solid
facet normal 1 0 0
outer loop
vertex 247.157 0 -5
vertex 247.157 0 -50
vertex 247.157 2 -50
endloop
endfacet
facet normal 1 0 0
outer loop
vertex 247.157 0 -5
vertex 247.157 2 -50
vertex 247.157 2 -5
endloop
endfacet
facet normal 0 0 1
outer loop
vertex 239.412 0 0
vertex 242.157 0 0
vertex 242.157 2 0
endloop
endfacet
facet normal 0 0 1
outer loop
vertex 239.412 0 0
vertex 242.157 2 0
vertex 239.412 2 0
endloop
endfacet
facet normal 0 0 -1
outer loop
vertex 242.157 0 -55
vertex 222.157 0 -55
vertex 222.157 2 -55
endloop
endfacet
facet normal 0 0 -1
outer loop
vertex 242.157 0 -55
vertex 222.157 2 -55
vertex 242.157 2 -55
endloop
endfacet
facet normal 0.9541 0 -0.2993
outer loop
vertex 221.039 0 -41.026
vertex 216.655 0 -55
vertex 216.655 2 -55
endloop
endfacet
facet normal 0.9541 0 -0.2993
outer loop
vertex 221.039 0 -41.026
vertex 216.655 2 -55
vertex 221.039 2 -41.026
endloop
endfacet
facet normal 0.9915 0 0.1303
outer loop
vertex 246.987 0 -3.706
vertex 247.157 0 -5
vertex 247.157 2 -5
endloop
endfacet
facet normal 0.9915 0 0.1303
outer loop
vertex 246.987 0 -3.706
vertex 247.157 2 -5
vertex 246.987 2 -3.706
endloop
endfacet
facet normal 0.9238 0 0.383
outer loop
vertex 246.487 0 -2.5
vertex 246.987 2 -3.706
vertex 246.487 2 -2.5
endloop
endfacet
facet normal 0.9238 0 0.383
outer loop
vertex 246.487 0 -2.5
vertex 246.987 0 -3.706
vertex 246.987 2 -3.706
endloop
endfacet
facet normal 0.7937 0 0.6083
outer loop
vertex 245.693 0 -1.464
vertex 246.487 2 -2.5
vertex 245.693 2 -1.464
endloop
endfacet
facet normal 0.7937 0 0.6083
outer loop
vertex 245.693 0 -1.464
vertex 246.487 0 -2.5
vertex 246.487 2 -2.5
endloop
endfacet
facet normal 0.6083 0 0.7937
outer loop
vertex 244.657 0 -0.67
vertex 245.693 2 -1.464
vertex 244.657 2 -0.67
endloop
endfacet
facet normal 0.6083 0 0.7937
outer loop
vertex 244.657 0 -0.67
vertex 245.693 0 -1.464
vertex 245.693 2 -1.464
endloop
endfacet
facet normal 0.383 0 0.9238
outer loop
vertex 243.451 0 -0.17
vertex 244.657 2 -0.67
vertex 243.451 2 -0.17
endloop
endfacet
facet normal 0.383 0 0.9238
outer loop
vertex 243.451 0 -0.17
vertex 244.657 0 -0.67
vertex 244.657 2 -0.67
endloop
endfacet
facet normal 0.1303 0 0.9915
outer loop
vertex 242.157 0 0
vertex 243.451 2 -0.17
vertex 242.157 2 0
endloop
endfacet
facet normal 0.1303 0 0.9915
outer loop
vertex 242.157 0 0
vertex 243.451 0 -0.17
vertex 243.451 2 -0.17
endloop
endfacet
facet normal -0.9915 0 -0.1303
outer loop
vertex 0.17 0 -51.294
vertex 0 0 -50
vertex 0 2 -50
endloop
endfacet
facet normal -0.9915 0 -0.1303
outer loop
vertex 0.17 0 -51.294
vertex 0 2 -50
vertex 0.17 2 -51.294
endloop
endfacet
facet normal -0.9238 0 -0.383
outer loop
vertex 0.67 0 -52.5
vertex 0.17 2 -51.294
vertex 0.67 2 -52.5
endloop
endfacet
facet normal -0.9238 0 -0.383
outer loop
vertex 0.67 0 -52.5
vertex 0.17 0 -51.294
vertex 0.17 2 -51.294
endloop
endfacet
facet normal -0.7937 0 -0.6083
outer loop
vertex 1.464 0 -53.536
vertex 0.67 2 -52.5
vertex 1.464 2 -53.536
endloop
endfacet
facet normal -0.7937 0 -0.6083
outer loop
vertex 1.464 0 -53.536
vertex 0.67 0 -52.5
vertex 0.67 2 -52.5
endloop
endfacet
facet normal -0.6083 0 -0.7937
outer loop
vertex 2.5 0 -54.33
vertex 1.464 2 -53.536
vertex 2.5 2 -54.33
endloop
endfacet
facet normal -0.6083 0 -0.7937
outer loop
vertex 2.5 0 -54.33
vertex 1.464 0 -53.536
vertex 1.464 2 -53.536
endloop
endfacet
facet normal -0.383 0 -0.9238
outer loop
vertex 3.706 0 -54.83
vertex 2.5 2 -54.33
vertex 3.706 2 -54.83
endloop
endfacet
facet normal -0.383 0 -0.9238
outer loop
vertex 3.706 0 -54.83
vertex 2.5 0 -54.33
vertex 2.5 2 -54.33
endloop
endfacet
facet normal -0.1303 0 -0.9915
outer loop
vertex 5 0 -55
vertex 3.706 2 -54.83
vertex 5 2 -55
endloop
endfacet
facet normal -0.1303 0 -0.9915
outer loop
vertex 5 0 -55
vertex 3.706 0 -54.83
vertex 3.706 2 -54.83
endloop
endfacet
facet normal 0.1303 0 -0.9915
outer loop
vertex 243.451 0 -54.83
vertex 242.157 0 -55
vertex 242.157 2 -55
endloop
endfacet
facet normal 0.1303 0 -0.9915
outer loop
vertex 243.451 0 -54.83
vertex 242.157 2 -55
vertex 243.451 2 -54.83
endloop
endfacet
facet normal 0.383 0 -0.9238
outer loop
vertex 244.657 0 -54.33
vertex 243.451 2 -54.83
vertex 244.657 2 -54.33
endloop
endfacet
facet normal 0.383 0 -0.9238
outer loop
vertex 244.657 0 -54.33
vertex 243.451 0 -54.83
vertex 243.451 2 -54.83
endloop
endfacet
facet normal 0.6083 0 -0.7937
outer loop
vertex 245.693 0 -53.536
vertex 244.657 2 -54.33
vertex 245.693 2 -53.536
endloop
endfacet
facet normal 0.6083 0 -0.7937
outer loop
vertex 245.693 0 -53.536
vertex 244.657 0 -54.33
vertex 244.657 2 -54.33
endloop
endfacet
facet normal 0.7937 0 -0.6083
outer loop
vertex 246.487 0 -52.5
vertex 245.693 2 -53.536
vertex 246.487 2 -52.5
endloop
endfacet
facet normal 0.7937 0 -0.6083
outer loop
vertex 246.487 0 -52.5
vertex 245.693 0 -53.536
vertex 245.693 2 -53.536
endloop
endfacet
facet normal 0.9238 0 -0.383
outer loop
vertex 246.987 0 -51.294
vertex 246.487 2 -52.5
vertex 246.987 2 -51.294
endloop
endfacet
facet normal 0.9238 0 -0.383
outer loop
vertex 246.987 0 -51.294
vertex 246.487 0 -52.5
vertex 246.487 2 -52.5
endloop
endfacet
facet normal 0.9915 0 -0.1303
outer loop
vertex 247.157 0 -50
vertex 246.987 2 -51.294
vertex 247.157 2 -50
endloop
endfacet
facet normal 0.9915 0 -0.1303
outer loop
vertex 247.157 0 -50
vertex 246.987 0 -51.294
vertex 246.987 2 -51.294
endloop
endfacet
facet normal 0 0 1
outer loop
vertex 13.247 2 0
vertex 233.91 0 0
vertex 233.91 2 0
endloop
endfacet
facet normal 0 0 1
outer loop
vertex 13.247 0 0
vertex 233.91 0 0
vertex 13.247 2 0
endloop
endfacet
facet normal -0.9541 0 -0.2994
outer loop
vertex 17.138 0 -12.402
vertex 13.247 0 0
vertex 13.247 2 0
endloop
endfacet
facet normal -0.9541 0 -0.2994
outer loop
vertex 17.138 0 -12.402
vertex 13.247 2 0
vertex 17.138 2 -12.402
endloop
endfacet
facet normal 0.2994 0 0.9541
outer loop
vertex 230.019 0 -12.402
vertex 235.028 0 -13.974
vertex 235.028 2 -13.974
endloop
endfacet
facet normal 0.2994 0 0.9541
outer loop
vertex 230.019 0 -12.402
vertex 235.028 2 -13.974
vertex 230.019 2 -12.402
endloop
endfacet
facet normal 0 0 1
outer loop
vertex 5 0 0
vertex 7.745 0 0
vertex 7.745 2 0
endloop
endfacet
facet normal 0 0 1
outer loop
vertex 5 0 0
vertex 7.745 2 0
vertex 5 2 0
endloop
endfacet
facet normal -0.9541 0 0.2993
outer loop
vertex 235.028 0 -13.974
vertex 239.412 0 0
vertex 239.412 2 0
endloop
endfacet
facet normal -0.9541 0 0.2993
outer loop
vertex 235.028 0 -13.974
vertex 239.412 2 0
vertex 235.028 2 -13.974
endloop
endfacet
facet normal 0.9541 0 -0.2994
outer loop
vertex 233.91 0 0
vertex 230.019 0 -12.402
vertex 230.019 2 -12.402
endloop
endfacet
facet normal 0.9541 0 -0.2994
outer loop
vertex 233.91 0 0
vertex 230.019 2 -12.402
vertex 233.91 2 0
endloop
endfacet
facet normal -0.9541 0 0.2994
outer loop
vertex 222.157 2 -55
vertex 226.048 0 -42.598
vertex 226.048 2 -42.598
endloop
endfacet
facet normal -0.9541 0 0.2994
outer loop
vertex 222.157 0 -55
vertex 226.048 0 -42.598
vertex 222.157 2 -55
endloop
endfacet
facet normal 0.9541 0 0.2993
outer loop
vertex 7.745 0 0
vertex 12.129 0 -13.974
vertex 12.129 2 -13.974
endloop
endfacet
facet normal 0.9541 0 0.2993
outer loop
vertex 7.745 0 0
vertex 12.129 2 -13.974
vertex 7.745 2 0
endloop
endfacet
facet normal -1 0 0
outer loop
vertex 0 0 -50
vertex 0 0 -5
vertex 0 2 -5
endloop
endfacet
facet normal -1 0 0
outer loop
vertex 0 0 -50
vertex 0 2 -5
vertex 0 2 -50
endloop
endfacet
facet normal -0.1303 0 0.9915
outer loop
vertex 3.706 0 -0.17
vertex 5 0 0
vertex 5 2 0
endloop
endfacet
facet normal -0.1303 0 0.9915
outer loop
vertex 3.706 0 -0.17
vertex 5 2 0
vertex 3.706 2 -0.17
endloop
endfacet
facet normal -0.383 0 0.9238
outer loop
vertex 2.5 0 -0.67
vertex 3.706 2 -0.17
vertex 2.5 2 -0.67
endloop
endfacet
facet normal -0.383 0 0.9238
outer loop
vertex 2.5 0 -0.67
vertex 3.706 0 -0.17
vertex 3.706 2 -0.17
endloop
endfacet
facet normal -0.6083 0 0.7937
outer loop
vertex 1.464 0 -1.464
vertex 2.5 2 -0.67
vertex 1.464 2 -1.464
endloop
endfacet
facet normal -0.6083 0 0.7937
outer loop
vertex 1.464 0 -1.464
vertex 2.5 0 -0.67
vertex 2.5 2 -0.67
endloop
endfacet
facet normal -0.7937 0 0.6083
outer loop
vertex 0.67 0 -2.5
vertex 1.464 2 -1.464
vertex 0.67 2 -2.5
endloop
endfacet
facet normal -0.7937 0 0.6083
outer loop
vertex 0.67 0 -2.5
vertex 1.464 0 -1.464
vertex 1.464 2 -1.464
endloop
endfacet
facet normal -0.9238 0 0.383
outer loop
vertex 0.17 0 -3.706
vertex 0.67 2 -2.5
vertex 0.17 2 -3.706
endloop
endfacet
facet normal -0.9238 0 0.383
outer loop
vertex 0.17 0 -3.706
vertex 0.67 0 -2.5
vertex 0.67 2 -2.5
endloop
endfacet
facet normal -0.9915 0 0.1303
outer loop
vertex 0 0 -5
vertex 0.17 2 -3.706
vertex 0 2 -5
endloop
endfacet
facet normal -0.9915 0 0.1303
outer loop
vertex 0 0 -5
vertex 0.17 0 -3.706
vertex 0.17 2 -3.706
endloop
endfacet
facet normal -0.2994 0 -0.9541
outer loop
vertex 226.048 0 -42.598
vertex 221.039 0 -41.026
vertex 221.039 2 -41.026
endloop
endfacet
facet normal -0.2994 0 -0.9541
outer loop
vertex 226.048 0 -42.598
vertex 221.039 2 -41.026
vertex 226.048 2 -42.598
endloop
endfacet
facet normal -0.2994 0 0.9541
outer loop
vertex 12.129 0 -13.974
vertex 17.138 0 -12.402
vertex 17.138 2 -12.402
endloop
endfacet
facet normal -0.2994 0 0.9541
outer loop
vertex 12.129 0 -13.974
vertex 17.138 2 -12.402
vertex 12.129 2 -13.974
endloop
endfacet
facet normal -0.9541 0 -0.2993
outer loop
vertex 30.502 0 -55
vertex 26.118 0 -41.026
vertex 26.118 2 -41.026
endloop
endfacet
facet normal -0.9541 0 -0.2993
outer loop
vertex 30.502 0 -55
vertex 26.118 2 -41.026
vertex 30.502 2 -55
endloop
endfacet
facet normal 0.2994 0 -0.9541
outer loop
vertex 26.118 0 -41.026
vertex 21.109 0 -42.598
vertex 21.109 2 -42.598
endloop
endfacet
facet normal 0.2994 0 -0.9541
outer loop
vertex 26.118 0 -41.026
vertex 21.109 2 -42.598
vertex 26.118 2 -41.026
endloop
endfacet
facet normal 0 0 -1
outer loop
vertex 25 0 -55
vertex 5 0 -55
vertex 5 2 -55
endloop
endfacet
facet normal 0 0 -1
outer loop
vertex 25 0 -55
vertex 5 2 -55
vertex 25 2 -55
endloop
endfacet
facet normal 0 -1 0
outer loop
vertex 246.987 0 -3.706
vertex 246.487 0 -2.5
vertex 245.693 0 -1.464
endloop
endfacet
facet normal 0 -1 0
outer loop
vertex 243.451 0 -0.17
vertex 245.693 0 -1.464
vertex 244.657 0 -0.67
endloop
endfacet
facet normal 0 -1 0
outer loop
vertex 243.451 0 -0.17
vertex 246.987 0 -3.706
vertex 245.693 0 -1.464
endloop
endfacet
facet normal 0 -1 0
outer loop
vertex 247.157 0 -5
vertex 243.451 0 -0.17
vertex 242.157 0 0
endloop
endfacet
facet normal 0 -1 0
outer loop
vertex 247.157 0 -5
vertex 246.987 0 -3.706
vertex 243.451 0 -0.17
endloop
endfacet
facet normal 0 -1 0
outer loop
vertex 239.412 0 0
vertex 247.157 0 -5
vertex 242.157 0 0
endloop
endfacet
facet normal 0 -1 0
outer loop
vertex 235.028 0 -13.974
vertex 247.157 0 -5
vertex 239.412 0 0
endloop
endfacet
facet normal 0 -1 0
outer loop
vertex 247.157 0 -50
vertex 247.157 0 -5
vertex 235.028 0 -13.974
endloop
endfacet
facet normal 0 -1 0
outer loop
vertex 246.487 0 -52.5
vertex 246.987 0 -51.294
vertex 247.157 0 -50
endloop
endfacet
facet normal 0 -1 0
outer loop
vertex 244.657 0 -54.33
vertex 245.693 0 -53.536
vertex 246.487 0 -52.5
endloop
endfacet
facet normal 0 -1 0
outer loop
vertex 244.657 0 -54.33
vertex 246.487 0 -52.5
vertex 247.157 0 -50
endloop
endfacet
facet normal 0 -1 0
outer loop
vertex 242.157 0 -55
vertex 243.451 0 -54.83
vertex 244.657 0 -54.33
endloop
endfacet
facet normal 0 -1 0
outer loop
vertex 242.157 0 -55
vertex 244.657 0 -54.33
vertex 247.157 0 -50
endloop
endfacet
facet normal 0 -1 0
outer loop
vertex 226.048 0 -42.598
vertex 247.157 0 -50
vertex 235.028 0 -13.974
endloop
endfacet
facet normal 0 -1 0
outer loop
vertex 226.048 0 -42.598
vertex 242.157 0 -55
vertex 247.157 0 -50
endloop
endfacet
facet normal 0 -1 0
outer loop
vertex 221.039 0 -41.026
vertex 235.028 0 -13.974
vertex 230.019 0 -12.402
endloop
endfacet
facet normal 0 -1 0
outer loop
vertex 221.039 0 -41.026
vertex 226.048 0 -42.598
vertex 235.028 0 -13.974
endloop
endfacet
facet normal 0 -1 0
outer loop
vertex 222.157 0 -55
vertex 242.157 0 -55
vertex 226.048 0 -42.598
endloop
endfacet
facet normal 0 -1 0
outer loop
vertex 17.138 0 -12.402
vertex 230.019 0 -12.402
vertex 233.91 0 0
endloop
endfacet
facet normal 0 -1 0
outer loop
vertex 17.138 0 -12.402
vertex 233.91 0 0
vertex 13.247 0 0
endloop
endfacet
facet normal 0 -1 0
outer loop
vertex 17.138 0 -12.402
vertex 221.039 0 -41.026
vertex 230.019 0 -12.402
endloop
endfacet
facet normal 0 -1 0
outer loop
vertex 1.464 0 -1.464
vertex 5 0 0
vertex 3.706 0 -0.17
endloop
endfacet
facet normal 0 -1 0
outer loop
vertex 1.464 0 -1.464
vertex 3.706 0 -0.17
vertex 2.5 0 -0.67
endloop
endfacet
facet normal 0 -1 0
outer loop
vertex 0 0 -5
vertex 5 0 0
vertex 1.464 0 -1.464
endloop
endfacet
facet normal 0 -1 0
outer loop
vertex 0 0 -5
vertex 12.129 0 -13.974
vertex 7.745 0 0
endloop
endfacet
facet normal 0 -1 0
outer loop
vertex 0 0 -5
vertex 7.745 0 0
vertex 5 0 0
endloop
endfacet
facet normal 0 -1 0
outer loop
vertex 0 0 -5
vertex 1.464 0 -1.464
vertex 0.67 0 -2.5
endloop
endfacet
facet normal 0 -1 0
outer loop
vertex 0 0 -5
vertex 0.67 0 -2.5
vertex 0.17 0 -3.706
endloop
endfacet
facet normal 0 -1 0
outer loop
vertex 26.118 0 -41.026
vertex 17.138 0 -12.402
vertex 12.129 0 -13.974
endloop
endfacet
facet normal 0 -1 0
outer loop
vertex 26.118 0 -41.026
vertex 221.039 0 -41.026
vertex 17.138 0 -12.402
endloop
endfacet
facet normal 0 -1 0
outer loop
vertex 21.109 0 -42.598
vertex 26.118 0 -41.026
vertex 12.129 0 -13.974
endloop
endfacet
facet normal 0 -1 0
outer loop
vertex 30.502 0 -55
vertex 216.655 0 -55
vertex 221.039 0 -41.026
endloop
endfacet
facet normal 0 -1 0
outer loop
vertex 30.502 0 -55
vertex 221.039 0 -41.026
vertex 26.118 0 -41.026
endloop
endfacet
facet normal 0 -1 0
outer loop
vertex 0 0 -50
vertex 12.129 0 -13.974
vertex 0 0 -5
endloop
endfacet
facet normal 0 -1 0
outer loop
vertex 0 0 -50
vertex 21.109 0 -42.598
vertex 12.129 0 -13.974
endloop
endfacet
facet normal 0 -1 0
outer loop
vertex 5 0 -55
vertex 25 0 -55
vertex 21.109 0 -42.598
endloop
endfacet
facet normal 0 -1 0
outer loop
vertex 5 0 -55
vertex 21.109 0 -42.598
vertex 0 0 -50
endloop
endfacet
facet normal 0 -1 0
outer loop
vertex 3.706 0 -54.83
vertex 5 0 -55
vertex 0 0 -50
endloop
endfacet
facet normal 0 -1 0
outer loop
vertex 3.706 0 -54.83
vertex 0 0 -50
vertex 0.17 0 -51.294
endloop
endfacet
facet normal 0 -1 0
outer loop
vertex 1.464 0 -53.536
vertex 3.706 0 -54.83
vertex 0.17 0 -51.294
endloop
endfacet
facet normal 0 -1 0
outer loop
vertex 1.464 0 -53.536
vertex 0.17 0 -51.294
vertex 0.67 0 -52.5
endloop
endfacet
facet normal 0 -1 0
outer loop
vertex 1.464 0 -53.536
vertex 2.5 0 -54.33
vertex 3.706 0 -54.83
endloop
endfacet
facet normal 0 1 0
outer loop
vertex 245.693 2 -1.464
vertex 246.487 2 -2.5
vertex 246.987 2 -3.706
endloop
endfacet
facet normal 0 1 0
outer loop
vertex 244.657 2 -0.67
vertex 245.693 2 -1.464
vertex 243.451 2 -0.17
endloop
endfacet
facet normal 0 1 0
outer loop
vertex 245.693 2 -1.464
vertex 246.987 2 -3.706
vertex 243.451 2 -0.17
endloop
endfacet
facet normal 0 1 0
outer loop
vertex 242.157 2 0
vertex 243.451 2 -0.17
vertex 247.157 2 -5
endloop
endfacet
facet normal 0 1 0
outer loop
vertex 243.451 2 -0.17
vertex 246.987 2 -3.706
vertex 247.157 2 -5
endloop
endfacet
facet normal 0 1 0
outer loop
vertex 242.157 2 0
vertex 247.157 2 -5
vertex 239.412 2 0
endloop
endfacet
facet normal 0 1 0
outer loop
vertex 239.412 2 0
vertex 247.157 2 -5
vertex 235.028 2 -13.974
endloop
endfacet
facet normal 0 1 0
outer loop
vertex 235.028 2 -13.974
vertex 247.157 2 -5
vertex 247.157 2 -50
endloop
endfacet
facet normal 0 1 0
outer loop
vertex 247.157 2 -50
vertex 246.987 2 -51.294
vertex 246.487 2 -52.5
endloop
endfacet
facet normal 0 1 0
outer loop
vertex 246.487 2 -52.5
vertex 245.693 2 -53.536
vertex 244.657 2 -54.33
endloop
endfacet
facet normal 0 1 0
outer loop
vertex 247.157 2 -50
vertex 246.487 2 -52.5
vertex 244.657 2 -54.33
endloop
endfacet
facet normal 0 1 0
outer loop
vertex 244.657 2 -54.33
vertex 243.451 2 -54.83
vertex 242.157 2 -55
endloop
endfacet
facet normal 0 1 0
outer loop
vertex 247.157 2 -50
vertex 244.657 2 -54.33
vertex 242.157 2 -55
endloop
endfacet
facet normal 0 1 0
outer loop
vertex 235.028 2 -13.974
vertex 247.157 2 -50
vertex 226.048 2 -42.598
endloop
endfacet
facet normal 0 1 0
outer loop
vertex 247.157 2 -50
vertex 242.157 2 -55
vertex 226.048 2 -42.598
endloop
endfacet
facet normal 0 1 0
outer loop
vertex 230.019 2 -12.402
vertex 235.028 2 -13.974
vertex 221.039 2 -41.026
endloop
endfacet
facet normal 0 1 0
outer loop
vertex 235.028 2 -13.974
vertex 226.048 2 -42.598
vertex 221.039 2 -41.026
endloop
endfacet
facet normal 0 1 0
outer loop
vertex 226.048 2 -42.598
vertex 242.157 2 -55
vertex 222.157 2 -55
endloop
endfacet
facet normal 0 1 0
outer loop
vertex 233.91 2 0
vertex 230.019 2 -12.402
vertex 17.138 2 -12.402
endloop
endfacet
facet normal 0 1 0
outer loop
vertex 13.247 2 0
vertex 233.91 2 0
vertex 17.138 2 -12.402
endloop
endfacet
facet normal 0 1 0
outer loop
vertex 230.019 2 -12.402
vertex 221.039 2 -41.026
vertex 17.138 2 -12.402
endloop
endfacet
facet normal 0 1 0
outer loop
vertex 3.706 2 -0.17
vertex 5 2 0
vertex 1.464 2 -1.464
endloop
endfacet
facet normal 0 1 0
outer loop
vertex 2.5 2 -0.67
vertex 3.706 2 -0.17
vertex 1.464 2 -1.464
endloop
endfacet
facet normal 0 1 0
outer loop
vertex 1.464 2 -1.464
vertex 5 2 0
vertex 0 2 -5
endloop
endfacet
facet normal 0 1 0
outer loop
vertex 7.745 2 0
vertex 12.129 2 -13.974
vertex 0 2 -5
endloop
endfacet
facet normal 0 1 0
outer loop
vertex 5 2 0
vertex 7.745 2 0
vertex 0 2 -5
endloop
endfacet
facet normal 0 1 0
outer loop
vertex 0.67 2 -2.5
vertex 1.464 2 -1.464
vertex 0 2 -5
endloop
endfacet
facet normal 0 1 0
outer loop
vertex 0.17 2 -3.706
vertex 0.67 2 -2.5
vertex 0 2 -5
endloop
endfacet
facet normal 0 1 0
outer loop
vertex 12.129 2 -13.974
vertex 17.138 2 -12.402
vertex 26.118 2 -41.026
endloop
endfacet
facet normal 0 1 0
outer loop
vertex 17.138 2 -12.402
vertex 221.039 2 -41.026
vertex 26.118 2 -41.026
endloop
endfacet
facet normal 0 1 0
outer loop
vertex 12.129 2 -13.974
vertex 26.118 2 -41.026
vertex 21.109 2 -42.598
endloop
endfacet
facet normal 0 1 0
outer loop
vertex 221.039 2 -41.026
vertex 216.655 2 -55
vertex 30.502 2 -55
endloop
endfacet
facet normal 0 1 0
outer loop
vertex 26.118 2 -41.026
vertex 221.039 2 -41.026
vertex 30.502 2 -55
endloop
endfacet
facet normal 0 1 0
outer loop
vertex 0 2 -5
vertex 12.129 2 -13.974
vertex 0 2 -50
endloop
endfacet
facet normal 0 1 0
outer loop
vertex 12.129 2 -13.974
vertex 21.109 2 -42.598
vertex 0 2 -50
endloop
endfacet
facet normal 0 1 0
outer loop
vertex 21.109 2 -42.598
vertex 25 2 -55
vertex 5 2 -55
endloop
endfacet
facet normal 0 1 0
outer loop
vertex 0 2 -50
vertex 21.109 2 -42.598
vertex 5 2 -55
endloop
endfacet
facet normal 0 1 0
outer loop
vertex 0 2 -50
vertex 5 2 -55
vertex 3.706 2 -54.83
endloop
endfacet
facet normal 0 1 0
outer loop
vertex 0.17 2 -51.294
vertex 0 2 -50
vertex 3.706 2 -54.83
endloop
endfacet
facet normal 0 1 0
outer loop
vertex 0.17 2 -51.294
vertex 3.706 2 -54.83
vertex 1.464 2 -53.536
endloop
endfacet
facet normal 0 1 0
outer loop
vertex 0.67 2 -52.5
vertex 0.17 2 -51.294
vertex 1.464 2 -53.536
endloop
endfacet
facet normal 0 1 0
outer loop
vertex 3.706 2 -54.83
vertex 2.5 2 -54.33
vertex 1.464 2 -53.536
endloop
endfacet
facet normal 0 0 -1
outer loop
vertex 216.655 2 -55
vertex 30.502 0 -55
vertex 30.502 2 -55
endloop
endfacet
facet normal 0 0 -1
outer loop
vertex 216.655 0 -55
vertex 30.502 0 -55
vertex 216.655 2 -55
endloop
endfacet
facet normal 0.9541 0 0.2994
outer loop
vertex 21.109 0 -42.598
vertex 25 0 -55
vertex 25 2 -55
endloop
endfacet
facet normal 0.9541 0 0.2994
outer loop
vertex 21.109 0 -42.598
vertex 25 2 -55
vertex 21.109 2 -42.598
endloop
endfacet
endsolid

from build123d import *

# Parameters (mm, degrees)
BOSS_EXTRUDE1_DEPTH = 2


with BuildPart() as part:
    # Sketch1 → Boss-Extrude1 (new body)
    with BuildSketch(Plane(origin=(0, 0, 0), x_dir=(1, 0, 0), z_dir=(0, 1, 0))):
        with BuildLine():
            Line((25, 55), (21.109165494, 42.59796501))
            Line((21.109165494, 42.59796501), (26.118434554, 41.026429618))
            Line((26.118434554, 41.026429618), (30.502299771, 55))
            Line((30.502299771, 55), (216.654895807, 55))
            Line((216.654895807, 55), (221.038761024, 41.026429618))
            Line((221.038761024, 41.026429618), (226.048030084, 42.59796501))
            Line((226.048030084, 42.59796501), (222.157195577, 55))
            Line((222.157195577, 55), (242.157195577, 55))
            ThreePointArc((242.157195577, 55), (245.692729483, 53.535533906), (247.157195577, 50))
            Line((247.157195577, 50), (247.157195577, 5))
            ThreePointArc((247.157195577, 5), (245.692729483, 1.464466094), (242.157195577, 0))
            Line((242.157195577, 0), (239.412097536, 0))
            Line((239.412097536, 0), (235.028232319, 13.973570382))
            Line((235.028232319, 13.973570382), (230.018963259, 12.40203499))
            Line((230.018963259, 12.40203499), (233.909797765, 0))
            Line((233.909797765, 0), (13.247397812, 0))
            Line((13.247397812, 0), (17.138232319, 12.40203499))
            Line((17.138232319, 12.40203499), (12.128963259, 13.973570382))
            Line((12.128963259, 13.973570382), (7.745098042, 0))
            Line((7.745098042, 0), (5, 0))
            ThreePointArc((5, 0), (1.464466094, 1.464466094), (0, 5))
            Line((0, 5), (0, 50))
            ThreePointArc((0, 50), (1.464466094, 53.535533906), (5, 55))
            Line((5, 55), (25, 55))
        make_face()
    extrude(amount=BOSS_EXTRUDE1_DEPTH)


solid = part.part
